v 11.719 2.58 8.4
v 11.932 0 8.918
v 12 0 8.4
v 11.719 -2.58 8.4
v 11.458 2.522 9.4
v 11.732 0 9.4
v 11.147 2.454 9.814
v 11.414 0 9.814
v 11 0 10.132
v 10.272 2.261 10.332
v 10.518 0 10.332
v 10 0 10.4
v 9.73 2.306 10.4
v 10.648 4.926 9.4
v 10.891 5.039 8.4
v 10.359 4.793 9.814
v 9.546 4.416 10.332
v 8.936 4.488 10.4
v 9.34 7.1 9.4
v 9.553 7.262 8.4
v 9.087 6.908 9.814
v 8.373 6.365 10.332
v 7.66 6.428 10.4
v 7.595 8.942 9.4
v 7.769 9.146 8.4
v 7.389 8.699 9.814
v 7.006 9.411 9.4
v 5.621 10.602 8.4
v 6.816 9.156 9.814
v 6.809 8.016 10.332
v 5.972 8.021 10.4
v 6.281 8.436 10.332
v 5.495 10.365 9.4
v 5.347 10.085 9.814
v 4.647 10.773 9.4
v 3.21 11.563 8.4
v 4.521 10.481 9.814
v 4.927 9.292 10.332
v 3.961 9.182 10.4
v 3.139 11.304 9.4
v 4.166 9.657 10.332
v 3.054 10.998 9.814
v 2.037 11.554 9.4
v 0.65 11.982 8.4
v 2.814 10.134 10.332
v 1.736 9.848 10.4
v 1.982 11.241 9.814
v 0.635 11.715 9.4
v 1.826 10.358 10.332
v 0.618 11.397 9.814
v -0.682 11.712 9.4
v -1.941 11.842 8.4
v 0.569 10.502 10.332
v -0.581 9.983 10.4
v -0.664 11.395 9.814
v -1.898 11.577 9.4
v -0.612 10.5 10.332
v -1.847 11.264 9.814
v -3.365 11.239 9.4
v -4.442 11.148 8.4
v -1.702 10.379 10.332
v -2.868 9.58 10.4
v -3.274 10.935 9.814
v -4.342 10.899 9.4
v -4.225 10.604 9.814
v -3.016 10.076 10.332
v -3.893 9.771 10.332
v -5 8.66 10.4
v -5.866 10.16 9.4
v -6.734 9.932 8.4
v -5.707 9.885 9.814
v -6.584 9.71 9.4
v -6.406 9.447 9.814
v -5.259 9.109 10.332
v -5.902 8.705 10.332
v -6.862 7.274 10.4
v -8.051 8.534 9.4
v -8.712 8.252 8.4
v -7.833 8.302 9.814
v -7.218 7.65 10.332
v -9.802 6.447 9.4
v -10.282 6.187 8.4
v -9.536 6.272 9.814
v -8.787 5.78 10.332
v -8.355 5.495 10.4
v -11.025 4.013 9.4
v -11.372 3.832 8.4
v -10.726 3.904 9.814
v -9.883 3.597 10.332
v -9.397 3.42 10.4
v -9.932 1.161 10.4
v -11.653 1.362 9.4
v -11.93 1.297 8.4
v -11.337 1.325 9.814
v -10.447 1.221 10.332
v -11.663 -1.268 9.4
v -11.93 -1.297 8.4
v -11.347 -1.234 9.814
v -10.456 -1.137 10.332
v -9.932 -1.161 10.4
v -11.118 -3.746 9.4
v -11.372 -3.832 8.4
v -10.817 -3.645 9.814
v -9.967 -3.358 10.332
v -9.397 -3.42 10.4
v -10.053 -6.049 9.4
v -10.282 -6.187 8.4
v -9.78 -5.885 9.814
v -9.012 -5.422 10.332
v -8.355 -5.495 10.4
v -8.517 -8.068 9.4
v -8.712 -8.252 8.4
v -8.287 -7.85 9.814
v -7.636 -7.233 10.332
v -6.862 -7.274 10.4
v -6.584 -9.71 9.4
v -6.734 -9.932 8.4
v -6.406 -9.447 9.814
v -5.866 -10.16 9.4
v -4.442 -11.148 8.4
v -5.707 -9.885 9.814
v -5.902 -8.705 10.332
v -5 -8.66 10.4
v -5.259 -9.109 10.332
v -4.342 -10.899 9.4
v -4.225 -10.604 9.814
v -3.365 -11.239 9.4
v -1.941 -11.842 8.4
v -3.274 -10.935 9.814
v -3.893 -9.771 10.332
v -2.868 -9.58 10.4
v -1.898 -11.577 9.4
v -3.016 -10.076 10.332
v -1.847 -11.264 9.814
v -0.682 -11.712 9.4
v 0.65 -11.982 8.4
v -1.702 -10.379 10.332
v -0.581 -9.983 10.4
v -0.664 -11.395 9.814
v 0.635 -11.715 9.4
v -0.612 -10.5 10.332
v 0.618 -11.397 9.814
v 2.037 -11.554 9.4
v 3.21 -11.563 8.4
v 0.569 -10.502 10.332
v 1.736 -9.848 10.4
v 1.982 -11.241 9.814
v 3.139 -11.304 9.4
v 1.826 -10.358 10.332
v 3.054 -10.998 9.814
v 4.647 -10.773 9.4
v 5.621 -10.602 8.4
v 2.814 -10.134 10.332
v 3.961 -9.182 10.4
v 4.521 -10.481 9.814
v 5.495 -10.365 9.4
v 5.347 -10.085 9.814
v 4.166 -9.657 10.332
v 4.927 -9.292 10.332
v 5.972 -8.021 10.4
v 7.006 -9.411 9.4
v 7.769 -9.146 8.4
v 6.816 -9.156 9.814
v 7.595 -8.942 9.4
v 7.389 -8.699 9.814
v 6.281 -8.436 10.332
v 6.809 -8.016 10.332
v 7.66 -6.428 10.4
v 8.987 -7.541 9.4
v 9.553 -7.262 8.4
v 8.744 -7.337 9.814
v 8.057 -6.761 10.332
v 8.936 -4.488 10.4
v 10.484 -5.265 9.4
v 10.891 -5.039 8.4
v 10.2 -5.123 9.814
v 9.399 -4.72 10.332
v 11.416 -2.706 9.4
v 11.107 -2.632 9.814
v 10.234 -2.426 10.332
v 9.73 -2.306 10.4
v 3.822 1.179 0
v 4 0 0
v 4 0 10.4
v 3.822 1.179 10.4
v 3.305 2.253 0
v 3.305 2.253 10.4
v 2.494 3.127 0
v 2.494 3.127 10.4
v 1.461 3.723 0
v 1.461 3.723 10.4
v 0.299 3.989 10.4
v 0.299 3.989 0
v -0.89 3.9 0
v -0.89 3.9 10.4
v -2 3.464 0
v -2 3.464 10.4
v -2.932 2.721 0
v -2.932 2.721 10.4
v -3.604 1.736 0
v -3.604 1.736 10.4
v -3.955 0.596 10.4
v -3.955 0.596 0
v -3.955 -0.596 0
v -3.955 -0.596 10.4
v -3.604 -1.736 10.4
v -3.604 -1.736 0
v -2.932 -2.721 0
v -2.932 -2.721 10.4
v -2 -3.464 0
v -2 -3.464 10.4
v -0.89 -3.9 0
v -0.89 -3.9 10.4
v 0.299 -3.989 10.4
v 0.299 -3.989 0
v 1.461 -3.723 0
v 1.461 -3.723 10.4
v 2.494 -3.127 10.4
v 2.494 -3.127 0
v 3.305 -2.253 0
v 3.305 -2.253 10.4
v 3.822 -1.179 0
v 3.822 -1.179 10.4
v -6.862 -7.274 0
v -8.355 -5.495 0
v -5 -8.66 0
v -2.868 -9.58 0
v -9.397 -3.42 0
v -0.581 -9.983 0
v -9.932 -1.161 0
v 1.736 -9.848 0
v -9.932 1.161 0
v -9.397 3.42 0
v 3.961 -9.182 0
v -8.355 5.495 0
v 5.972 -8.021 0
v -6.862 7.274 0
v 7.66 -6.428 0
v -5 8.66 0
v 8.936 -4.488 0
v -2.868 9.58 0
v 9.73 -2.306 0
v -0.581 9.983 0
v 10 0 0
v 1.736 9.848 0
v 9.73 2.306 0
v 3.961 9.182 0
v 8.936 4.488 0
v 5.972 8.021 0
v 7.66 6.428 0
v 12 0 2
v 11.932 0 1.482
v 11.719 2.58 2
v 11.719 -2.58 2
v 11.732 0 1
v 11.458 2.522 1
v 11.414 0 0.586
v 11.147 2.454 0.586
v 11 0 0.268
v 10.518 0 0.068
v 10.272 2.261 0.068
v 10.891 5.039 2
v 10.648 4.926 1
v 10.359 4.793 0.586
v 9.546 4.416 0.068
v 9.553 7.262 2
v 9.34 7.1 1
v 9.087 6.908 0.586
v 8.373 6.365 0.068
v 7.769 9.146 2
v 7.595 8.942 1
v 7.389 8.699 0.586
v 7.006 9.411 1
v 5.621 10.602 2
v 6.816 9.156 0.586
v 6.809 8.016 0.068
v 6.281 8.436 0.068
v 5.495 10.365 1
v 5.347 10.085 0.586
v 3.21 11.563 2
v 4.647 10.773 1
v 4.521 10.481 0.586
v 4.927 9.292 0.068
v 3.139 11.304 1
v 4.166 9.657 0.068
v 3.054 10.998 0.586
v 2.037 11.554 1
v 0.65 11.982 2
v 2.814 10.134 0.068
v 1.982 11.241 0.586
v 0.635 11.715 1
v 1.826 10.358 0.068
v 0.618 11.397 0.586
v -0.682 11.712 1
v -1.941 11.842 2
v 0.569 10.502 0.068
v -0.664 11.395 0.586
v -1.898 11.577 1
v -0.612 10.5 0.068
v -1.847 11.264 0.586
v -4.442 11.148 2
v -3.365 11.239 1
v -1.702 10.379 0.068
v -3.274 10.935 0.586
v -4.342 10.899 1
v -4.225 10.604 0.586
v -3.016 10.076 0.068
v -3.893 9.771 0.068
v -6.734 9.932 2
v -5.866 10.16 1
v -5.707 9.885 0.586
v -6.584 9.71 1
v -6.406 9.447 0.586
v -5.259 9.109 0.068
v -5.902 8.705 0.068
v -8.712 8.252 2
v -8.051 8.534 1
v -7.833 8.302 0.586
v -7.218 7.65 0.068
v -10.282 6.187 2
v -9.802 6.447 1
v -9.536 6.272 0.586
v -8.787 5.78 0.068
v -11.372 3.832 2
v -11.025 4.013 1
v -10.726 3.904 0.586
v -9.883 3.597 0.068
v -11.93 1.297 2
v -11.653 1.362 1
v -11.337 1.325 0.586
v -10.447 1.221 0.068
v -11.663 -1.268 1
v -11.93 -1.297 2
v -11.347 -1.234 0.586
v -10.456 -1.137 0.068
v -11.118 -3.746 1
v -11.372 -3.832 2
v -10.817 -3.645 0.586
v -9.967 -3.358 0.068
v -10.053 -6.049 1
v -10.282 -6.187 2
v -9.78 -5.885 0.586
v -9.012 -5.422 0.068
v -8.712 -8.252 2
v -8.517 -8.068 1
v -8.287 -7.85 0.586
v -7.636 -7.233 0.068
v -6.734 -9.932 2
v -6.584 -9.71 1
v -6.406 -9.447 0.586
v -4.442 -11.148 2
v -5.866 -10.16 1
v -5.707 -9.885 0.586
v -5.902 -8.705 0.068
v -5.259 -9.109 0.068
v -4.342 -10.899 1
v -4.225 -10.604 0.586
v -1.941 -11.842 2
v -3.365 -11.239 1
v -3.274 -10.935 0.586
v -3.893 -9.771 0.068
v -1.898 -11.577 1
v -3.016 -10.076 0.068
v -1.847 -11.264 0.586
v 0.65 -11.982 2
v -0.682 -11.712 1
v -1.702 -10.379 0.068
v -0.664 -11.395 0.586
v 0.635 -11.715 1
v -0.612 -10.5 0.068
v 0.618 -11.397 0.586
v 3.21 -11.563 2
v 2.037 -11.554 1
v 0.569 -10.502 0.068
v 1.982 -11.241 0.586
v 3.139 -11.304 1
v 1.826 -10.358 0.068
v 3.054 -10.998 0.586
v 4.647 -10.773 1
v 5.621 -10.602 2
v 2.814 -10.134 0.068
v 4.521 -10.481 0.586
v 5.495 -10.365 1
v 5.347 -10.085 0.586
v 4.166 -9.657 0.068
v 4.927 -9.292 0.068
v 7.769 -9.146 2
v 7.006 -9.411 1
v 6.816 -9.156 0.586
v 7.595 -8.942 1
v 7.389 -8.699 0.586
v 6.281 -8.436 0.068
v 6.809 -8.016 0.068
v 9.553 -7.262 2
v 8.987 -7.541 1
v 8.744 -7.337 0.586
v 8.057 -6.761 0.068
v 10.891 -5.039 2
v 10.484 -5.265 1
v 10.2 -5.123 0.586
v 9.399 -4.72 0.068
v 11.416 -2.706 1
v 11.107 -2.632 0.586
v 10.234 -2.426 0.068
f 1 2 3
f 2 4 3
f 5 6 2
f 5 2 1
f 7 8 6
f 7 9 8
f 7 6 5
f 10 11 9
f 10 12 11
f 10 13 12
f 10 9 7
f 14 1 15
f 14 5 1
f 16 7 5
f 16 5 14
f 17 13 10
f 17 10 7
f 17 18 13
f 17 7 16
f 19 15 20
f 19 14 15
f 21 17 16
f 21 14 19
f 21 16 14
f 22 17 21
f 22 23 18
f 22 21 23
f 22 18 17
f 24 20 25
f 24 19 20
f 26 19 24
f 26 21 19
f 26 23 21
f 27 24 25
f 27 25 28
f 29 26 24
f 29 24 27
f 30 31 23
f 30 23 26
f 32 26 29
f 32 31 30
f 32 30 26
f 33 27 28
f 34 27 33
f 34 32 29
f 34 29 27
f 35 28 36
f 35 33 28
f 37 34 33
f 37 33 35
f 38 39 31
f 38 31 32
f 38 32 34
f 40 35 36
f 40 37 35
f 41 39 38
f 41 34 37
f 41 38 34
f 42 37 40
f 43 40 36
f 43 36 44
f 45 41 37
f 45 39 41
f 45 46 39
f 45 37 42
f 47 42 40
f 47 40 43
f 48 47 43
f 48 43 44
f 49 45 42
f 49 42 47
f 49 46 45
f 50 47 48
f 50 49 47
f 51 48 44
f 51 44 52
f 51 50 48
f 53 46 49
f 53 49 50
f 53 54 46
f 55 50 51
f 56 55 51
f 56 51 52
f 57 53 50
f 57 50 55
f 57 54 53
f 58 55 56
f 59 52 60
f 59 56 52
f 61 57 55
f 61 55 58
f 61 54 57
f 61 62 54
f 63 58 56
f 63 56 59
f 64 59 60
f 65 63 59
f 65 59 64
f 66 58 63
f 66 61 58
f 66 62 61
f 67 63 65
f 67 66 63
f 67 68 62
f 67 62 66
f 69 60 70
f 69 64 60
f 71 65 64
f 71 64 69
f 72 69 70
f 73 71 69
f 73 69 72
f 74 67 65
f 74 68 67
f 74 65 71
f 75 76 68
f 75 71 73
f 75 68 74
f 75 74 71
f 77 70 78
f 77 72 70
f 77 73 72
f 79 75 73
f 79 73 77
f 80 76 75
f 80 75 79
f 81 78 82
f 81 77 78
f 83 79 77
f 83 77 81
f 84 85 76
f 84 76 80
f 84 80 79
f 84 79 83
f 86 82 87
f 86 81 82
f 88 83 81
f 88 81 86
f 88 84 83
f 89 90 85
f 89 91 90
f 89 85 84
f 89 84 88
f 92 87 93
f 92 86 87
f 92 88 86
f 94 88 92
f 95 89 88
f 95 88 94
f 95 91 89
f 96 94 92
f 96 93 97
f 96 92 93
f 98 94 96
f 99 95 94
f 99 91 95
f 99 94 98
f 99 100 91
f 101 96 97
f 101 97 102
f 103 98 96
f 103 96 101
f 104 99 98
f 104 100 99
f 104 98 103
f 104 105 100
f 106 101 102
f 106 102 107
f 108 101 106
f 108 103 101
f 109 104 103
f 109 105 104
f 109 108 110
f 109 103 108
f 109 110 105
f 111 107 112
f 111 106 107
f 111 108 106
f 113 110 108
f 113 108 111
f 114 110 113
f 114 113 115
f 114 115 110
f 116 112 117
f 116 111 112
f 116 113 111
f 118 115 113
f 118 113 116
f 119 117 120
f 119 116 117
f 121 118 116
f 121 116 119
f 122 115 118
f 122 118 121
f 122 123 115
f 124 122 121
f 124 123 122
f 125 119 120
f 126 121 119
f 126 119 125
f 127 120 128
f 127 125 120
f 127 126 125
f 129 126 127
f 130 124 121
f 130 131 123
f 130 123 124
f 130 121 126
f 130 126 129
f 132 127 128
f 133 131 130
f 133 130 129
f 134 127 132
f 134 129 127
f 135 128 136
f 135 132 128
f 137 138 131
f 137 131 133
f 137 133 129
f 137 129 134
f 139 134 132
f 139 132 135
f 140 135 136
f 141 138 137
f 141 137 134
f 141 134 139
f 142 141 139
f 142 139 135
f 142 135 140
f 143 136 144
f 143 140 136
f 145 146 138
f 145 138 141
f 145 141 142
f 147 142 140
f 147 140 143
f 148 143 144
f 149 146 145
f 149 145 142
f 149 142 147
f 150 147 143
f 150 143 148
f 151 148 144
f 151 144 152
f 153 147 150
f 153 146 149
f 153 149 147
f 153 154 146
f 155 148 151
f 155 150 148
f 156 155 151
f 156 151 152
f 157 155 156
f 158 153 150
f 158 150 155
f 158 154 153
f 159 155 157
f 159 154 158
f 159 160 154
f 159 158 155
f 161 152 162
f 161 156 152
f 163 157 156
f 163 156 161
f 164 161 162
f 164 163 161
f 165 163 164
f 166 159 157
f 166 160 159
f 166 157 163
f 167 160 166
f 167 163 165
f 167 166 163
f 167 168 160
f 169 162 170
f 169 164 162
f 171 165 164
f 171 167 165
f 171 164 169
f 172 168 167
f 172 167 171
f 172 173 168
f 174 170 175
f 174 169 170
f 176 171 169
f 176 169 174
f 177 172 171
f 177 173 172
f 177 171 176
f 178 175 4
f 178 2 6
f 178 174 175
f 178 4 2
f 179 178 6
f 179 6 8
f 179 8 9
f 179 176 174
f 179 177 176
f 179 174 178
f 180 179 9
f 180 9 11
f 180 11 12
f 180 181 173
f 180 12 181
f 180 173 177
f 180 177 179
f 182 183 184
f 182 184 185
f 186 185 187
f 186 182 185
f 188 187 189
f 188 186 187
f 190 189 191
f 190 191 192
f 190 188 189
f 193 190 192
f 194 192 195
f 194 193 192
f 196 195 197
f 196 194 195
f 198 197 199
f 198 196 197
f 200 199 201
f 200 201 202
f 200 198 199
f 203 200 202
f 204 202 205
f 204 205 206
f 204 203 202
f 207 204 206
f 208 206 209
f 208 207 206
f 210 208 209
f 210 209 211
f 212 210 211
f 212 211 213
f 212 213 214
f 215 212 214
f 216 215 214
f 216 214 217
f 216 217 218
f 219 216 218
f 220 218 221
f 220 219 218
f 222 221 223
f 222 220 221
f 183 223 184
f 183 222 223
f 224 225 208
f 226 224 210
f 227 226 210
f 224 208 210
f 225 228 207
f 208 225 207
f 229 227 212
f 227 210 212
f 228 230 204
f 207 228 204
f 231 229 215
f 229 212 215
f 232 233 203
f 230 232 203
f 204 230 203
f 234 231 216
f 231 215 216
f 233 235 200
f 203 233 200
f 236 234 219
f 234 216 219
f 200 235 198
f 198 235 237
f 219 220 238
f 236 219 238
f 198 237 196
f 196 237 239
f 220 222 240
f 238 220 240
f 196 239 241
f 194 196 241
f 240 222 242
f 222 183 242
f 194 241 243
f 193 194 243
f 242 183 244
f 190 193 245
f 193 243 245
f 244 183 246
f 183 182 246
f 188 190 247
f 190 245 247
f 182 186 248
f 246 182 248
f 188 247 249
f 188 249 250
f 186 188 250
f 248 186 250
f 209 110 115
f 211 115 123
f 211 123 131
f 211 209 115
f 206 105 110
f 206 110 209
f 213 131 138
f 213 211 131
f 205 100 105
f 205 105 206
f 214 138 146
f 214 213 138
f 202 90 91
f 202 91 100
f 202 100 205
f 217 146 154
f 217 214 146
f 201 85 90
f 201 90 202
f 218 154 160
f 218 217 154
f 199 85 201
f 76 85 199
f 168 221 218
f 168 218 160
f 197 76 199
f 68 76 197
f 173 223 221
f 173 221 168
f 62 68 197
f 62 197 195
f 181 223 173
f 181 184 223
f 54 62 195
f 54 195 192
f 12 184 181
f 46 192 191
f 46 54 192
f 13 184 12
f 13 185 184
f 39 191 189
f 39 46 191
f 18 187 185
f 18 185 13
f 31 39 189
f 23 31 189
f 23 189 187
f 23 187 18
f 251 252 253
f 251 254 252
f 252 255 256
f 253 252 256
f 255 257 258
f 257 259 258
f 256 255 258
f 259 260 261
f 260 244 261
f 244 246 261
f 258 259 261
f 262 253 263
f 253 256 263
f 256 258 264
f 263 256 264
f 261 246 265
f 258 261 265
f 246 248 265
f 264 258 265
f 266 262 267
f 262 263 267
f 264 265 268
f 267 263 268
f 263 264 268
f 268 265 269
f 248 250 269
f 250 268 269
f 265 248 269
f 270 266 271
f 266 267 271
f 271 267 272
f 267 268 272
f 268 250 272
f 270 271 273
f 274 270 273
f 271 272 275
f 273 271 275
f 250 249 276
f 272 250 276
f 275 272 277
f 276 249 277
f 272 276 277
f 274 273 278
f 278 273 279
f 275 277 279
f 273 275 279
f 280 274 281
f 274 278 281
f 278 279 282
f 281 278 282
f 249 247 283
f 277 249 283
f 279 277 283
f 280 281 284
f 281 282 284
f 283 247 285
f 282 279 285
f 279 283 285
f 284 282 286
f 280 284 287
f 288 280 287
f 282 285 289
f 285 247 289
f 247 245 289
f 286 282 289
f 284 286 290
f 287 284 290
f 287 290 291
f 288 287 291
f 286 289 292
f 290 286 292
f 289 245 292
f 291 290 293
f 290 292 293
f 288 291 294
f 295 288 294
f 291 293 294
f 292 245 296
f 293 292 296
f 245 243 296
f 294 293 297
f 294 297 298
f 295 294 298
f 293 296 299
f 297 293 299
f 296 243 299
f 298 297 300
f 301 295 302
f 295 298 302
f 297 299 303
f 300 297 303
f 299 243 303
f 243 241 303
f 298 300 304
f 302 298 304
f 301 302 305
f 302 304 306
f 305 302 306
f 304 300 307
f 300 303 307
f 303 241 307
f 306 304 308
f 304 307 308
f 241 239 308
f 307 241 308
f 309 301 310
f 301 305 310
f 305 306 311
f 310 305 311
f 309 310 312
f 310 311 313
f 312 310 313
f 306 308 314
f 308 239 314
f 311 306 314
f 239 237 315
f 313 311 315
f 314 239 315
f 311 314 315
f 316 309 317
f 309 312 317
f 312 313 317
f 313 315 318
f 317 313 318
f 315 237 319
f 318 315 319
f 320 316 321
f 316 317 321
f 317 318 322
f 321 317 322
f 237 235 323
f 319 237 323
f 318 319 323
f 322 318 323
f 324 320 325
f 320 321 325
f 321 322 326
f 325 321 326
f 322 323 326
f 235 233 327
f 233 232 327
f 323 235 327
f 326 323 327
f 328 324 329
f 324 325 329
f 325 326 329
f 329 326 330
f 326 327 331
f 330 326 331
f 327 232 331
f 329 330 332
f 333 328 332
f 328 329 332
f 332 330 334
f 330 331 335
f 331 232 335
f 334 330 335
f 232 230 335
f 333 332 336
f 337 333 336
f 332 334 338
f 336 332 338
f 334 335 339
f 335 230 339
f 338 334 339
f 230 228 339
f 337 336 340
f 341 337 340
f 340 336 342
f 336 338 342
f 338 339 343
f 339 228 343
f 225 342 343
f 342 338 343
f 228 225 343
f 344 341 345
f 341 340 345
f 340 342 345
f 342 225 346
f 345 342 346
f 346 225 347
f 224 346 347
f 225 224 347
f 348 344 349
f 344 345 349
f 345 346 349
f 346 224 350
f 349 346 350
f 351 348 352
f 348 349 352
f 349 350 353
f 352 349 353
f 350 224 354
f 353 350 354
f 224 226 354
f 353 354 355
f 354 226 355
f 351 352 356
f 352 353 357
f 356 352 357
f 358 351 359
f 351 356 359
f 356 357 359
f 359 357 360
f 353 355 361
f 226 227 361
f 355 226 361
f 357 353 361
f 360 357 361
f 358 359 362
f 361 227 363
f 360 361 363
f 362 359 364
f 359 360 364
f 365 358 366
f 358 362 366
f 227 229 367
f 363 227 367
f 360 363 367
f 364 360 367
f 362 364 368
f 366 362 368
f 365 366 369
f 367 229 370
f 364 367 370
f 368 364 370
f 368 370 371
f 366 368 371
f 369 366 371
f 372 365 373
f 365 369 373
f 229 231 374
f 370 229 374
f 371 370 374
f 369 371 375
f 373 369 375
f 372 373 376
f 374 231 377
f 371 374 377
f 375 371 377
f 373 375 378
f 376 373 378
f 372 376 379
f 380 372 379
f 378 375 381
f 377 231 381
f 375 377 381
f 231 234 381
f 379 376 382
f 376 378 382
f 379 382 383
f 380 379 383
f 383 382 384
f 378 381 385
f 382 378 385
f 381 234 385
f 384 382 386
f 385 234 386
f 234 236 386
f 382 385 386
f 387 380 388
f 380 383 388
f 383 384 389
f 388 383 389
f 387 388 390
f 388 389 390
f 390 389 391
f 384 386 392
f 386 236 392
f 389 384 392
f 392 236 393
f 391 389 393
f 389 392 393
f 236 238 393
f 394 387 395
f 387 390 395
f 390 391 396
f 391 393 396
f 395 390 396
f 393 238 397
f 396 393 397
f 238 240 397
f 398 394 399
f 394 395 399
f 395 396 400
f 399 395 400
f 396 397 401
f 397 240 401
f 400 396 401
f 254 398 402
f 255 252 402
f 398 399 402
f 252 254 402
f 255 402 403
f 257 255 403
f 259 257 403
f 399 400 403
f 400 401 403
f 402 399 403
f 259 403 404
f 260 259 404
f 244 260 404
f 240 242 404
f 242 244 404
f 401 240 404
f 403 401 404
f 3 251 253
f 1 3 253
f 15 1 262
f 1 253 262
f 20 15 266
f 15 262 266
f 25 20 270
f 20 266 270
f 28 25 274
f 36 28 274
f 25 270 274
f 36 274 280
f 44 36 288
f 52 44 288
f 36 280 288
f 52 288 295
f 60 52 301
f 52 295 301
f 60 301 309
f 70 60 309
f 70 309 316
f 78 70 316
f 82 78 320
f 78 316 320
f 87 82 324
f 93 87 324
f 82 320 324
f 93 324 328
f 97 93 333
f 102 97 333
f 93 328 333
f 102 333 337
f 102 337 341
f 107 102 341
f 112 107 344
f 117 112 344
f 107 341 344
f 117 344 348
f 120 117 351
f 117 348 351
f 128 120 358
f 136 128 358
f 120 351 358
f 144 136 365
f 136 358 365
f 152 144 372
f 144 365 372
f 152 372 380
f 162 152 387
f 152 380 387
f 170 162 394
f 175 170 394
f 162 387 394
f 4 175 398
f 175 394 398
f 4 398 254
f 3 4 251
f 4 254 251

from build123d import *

# Parameters (mm, degrees)
ESQUISSE1_R             = 12
BOSS_EXTRU_1_DEPTH      = 10.4
CONG_1_R                = 2
CONG_2_R                = 2
ESQUISSE2_R             = 4
ENL_V_MAT_EXTRU_1_DEPTH = 10.4


with BuildPart() as part:
    # Esquisse1 → Boss.-Extru.1 (new body)
    with BuildSketch(Plane.XY):
        Circle(ESQUISSE1_R)
    extrude(amount=BOSS_EXTRU_1_DEPTH)

    # Congé1
    cong_1_edges = [part.edges().sort_by_distance(p)[0] for p in [
        (-12, 0, 10.4),
    ]]
    fillet(cong_1_edges, radius=CONG_1_R)

    # Congé2
    cong_2_edges = [part.edges().sort_by_distance(p)[0] for p in [
        (-12, 0, 0),
    ]]
    fillet(cong_2_edges, radius=CONG_2_R)

    # Esquisse2 → Enlèv. mat.-Extru.1 (cut)
    with BuildSketch(Plane.XY):
        Circle(ESQUISSE2_R)
    extrude(amount=ENL_V_MAT_EXTRU_1_DEPTH, mode=Mode.SUBTRACT)


solid = part.part
